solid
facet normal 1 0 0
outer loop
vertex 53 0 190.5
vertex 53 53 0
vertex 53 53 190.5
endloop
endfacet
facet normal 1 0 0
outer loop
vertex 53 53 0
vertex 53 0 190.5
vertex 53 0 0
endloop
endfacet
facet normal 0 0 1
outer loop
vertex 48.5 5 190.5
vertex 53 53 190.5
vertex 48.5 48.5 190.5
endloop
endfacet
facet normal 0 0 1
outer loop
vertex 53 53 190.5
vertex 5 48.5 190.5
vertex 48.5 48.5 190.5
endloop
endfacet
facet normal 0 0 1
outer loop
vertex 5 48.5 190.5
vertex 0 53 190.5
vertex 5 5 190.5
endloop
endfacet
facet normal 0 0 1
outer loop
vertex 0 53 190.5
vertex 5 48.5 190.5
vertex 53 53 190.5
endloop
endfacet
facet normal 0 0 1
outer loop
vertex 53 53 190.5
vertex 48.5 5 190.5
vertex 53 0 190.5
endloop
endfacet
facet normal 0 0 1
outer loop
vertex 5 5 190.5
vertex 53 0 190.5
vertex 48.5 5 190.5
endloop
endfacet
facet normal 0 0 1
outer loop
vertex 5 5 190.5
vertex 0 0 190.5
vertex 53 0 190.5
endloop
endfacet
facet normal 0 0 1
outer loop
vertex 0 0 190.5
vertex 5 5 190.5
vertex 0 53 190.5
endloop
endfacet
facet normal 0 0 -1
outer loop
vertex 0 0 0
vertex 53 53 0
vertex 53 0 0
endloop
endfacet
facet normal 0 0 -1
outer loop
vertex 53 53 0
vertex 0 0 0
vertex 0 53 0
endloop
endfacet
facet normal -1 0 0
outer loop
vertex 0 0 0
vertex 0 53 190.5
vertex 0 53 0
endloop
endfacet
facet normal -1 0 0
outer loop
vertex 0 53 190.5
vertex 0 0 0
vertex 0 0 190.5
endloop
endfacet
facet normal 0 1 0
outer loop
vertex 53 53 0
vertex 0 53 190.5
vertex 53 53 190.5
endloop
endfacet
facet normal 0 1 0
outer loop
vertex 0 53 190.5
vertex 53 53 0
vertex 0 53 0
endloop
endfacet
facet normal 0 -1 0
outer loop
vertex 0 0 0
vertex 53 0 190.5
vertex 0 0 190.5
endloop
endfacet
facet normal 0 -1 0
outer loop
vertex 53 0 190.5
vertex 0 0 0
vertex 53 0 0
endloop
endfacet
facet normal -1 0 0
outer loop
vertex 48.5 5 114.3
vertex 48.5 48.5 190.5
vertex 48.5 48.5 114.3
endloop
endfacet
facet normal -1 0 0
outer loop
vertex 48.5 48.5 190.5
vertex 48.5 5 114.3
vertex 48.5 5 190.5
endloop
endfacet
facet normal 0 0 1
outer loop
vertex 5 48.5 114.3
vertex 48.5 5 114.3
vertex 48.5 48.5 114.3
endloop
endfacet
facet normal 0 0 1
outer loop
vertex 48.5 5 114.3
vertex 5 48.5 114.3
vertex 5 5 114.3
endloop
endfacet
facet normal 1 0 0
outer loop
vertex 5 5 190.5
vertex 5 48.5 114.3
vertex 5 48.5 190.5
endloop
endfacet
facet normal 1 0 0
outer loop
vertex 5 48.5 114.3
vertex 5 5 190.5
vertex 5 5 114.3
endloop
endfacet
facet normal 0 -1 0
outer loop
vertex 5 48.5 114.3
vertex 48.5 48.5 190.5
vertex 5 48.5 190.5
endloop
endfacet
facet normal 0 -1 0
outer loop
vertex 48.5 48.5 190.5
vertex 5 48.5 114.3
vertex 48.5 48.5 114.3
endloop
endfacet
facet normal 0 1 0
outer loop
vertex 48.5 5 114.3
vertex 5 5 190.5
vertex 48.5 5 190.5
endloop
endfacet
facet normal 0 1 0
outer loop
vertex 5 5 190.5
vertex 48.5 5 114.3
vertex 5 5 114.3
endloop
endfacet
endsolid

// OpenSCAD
leg_x = 43;
leg_y = 43;
extender_thickness = 10;
extender_overlap = 3 * 25.4;
extender_z = extender_overlap + (4.5 * 25.4);


echo(extender_z);

difference() {
    cube([leg_x + extender_thickness, leg_y + extender_thickness, extender_z]);
    translate([extender_thickness/2, extender_thickness/2, extender_z - extender_overlap]){
        color("red")
        cube([leg_x+.5, leg_y+.5, extender_z]);
    }
}
